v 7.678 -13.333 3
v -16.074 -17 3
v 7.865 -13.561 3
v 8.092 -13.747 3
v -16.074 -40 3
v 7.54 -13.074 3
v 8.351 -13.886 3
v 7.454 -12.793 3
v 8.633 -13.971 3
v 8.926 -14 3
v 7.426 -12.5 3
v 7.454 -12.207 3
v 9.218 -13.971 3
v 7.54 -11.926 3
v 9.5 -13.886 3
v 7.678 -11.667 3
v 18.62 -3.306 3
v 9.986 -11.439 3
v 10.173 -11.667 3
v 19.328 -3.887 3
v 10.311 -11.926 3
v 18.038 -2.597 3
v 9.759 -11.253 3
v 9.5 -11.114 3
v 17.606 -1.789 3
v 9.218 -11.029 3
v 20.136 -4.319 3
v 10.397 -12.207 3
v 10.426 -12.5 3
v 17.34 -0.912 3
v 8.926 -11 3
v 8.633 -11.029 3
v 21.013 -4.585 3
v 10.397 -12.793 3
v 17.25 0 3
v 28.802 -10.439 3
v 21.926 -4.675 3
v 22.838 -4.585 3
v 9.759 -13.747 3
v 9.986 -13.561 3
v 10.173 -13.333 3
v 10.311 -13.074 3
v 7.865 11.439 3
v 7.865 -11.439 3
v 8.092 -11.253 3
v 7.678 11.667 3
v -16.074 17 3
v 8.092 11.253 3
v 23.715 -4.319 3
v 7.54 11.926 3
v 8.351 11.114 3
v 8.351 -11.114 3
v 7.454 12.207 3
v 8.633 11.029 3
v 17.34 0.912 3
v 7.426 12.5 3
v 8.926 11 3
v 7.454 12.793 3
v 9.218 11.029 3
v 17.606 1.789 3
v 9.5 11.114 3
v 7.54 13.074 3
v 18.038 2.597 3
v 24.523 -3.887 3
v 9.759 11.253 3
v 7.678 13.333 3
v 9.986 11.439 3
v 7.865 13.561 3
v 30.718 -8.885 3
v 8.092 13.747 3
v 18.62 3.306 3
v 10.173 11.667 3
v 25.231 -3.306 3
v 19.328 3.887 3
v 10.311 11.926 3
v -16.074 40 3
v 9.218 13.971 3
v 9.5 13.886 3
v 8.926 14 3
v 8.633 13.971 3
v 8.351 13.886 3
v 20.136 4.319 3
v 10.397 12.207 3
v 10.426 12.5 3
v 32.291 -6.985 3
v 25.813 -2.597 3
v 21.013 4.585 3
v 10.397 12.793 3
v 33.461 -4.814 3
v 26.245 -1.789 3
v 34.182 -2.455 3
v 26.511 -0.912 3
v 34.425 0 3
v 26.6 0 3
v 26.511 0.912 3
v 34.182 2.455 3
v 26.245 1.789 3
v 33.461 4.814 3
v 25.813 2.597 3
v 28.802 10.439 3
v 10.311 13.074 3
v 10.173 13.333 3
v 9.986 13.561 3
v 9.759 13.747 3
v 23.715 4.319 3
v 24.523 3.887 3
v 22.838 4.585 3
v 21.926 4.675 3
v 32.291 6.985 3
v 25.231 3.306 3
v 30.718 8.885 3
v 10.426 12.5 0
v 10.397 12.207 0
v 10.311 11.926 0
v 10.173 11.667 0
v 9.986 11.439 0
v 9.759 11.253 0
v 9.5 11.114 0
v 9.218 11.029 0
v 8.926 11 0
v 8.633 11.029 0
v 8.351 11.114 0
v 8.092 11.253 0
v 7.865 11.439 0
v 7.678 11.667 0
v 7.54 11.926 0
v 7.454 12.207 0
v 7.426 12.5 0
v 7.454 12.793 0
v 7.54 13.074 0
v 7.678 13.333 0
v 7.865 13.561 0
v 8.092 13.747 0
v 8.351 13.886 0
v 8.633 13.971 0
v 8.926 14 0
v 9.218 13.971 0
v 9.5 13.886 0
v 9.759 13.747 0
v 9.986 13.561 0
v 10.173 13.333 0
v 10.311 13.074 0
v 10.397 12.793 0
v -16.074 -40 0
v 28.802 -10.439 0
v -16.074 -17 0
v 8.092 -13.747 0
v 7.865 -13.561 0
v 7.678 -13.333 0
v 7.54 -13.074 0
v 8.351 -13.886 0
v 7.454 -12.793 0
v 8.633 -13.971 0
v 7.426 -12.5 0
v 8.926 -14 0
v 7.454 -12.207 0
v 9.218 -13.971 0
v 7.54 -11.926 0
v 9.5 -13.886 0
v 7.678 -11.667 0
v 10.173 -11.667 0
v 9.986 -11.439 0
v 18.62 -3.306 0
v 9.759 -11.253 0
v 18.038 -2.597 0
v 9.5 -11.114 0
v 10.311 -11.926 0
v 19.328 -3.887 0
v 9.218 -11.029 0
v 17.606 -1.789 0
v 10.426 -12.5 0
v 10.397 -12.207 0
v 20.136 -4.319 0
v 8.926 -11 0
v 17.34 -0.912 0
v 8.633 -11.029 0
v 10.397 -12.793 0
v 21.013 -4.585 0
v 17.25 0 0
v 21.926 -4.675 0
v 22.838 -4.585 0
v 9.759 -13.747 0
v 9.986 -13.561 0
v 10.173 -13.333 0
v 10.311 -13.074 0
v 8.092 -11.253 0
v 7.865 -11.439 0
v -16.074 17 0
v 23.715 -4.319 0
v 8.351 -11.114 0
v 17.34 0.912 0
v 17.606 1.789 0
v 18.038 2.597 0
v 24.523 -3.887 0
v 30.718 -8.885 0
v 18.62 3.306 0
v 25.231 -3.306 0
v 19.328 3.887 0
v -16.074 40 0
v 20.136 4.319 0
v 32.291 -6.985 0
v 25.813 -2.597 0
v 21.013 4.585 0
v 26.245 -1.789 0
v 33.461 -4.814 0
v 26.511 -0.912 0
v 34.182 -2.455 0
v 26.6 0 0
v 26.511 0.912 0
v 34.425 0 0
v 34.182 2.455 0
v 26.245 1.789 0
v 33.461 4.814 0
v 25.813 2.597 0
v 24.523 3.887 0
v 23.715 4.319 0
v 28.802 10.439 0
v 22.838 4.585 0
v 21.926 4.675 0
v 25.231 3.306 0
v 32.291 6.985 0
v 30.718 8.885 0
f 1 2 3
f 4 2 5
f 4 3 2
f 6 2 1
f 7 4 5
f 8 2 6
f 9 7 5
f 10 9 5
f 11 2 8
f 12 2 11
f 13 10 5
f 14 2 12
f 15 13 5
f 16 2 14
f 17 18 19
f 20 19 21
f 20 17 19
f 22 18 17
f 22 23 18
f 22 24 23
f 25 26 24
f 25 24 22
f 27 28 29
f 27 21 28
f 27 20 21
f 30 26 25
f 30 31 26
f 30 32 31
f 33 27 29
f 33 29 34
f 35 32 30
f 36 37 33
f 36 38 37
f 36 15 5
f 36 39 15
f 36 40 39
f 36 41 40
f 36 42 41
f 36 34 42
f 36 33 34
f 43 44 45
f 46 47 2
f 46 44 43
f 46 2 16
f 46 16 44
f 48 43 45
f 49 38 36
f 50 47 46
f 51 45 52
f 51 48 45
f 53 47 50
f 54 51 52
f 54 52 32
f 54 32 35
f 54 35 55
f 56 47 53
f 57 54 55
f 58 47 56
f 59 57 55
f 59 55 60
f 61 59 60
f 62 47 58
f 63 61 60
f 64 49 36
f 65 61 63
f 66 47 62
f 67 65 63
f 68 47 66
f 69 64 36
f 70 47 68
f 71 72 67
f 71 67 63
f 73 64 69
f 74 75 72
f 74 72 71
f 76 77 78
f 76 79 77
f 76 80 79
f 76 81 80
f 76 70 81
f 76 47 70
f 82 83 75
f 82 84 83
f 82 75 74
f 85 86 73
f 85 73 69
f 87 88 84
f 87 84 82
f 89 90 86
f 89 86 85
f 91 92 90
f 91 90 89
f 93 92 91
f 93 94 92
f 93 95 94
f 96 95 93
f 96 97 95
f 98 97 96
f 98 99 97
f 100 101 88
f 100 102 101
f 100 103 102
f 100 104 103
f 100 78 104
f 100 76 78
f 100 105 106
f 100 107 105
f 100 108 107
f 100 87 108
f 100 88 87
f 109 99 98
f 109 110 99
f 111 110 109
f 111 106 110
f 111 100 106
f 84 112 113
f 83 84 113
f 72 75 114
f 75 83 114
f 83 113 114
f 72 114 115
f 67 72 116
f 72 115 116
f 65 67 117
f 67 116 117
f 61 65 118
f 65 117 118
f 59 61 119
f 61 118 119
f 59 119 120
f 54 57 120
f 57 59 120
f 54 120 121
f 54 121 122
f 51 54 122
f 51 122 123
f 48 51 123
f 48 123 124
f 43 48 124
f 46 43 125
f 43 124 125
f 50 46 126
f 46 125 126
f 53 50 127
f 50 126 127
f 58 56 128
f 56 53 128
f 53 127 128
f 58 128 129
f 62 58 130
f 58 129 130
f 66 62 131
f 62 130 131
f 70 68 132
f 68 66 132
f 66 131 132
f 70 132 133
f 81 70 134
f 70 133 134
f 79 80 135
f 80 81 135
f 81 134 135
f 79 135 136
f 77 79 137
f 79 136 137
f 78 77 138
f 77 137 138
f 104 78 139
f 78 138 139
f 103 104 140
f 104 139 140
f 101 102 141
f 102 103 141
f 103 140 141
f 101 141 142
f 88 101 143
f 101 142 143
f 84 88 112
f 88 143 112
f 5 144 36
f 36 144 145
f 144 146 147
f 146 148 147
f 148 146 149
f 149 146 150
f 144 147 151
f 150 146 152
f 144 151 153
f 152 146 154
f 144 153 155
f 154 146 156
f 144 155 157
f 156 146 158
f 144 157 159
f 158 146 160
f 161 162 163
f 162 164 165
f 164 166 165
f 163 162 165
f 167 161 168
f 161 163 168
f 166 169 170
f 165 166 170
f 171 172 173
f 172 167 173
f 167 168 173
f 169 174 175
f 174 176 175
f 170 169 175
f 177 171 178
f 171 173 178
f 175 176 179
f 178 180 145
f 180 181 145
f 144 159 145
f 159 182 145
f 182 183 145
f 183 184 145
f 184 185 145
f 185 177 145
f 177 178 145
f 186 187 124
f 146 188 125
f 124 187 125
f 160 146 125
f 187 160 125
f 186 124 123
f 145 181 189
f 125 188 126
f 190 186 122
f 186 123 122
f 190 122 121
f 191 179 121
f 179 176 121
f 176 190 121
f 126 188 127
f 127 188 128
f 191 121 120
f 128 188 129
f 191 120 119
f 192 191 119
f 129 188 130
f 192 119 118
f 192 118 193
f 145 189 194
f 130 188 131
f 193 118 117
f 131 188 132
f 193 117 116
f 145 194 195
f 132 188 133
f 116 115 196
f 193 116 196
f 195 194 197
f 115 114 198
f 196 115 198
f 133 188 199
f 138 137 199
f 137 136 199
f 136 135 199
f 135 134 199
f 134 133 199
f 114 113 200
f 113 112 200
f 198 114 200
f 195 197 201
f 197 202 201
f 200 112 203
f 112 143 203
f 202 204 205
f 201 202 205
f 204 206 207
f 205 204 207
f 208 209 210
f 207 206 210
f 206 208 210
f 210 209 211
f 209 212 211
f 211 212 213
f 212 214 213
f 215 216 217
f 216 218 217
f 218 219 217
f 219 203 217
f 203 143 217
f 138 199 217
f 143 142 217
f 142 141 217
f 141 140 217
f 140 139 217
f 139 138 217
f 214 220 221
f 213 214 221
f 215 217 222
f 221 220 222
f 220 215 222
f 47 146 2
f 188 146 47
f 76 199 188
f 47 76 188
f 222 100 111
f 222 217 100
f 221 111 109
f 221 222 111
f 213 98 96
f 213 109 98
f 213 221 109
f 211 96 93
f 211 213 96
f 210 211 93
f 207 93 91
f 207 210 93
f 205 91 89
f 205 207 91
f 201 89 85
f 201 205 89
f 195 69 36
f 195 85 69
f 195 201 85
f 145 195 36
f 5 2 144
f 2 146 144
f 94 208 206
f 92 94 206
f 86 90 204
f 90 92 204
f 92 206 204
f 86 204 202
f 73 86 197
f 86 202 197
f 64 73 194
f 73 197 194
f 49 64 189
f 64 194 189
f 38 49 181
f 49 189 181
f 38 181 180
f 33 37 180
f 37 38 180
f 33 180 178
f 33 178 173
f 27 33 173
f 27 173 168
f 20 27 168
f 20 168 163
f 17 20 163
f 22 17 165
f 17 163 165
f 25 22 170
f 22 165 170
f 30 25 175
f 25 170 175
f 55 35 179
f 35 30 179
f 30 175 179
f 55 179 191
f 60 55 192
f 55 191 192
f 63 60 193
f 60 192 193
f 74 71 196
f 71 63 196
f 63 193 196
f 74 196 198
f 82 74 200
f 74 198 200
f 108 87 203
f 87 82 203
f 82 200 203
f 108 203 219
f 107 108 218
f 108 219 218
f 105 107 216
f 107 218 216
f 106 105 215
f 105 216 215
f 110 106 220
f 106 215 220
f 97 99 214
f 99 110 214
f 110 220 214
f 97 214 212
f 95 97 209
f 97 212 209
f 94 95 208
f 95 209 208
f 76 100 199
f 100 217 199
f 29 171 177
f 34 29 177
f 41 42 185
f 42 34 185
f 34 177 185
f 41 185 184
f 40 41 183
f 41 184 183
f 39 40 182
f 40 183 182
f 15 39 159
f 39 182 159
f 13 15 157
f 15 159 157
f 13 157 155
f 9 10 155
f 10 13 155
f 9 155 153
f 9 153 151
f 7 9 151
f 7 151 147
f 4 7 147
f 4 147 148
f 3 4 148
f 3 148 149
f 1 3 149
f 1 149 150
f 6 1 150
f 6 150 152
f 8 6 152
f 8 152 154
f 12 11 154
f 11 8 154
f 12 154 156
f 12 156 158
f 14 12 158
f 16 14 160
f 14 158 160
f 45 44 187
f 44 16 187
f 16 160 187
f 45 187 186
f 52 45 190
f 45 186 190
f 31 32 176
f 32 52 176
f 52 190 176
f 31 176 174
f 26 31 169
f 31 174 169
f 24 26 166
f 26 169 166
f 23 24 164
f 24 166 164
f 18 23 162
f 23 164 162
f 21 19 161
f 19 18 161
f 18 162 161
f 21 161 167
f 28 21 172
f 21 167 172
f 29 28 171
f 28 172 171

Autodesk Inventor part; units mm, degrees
ref_plane "YZ Plane" through (0, 0, 0) normal (1, 0, 0) x (0, 1, 0)
ref_plane "XZ Plane" through (0, 0, 0) normal (0, 1, 0) x (-1, 0, 0)
ref_plane "XY Plane" through (0, 0, 0) normal (0, 0, 1) x (1, 0, 0)
sketch "Sketch1" plane through (0, 0, 0) normal (0, 0, 1) x (1, 0, 0)
  circle A0 centre (21.9255, 0) radius 6.5 construction
  arc A1 (28.8018, -10.4387) -> (28.8018, 10.4387) centre (21.9255, 0) ccw projected
  line L0 (-16.0745, -40) -> (28.8018, -10.4387) projected
  line L1 (28.8018, 10.4387) -> (-16.0745, 40) projected
  line L2 (-16.0745, 40) -> (-16.0745, 17) projected
  line L3 (-16.0745, -17) -> (-16.0745, -40) projected
  line L4 (-16.0745, -40) -> (-16.0745, 40)
  circle A2 centre (21.9255, 0) radius 4.675
  circle A3 centre (8.9255, -12.5) radius 1.5
  line L5 (-16.0745, 0) -> (34.4255, 0) construction
  circle A4 centre (8.9255, 12.5) radius 1.5
  point P0 (0, 0)
  dimension "d0" = 9.35
  dimension "d1" = 3
  dimension "d2" = 25
  dimension "d3" = 12.5
extrude "Extrusion1" add sketch "Sketch1" along normal blind 3
properties part number "Bearing lockers"
